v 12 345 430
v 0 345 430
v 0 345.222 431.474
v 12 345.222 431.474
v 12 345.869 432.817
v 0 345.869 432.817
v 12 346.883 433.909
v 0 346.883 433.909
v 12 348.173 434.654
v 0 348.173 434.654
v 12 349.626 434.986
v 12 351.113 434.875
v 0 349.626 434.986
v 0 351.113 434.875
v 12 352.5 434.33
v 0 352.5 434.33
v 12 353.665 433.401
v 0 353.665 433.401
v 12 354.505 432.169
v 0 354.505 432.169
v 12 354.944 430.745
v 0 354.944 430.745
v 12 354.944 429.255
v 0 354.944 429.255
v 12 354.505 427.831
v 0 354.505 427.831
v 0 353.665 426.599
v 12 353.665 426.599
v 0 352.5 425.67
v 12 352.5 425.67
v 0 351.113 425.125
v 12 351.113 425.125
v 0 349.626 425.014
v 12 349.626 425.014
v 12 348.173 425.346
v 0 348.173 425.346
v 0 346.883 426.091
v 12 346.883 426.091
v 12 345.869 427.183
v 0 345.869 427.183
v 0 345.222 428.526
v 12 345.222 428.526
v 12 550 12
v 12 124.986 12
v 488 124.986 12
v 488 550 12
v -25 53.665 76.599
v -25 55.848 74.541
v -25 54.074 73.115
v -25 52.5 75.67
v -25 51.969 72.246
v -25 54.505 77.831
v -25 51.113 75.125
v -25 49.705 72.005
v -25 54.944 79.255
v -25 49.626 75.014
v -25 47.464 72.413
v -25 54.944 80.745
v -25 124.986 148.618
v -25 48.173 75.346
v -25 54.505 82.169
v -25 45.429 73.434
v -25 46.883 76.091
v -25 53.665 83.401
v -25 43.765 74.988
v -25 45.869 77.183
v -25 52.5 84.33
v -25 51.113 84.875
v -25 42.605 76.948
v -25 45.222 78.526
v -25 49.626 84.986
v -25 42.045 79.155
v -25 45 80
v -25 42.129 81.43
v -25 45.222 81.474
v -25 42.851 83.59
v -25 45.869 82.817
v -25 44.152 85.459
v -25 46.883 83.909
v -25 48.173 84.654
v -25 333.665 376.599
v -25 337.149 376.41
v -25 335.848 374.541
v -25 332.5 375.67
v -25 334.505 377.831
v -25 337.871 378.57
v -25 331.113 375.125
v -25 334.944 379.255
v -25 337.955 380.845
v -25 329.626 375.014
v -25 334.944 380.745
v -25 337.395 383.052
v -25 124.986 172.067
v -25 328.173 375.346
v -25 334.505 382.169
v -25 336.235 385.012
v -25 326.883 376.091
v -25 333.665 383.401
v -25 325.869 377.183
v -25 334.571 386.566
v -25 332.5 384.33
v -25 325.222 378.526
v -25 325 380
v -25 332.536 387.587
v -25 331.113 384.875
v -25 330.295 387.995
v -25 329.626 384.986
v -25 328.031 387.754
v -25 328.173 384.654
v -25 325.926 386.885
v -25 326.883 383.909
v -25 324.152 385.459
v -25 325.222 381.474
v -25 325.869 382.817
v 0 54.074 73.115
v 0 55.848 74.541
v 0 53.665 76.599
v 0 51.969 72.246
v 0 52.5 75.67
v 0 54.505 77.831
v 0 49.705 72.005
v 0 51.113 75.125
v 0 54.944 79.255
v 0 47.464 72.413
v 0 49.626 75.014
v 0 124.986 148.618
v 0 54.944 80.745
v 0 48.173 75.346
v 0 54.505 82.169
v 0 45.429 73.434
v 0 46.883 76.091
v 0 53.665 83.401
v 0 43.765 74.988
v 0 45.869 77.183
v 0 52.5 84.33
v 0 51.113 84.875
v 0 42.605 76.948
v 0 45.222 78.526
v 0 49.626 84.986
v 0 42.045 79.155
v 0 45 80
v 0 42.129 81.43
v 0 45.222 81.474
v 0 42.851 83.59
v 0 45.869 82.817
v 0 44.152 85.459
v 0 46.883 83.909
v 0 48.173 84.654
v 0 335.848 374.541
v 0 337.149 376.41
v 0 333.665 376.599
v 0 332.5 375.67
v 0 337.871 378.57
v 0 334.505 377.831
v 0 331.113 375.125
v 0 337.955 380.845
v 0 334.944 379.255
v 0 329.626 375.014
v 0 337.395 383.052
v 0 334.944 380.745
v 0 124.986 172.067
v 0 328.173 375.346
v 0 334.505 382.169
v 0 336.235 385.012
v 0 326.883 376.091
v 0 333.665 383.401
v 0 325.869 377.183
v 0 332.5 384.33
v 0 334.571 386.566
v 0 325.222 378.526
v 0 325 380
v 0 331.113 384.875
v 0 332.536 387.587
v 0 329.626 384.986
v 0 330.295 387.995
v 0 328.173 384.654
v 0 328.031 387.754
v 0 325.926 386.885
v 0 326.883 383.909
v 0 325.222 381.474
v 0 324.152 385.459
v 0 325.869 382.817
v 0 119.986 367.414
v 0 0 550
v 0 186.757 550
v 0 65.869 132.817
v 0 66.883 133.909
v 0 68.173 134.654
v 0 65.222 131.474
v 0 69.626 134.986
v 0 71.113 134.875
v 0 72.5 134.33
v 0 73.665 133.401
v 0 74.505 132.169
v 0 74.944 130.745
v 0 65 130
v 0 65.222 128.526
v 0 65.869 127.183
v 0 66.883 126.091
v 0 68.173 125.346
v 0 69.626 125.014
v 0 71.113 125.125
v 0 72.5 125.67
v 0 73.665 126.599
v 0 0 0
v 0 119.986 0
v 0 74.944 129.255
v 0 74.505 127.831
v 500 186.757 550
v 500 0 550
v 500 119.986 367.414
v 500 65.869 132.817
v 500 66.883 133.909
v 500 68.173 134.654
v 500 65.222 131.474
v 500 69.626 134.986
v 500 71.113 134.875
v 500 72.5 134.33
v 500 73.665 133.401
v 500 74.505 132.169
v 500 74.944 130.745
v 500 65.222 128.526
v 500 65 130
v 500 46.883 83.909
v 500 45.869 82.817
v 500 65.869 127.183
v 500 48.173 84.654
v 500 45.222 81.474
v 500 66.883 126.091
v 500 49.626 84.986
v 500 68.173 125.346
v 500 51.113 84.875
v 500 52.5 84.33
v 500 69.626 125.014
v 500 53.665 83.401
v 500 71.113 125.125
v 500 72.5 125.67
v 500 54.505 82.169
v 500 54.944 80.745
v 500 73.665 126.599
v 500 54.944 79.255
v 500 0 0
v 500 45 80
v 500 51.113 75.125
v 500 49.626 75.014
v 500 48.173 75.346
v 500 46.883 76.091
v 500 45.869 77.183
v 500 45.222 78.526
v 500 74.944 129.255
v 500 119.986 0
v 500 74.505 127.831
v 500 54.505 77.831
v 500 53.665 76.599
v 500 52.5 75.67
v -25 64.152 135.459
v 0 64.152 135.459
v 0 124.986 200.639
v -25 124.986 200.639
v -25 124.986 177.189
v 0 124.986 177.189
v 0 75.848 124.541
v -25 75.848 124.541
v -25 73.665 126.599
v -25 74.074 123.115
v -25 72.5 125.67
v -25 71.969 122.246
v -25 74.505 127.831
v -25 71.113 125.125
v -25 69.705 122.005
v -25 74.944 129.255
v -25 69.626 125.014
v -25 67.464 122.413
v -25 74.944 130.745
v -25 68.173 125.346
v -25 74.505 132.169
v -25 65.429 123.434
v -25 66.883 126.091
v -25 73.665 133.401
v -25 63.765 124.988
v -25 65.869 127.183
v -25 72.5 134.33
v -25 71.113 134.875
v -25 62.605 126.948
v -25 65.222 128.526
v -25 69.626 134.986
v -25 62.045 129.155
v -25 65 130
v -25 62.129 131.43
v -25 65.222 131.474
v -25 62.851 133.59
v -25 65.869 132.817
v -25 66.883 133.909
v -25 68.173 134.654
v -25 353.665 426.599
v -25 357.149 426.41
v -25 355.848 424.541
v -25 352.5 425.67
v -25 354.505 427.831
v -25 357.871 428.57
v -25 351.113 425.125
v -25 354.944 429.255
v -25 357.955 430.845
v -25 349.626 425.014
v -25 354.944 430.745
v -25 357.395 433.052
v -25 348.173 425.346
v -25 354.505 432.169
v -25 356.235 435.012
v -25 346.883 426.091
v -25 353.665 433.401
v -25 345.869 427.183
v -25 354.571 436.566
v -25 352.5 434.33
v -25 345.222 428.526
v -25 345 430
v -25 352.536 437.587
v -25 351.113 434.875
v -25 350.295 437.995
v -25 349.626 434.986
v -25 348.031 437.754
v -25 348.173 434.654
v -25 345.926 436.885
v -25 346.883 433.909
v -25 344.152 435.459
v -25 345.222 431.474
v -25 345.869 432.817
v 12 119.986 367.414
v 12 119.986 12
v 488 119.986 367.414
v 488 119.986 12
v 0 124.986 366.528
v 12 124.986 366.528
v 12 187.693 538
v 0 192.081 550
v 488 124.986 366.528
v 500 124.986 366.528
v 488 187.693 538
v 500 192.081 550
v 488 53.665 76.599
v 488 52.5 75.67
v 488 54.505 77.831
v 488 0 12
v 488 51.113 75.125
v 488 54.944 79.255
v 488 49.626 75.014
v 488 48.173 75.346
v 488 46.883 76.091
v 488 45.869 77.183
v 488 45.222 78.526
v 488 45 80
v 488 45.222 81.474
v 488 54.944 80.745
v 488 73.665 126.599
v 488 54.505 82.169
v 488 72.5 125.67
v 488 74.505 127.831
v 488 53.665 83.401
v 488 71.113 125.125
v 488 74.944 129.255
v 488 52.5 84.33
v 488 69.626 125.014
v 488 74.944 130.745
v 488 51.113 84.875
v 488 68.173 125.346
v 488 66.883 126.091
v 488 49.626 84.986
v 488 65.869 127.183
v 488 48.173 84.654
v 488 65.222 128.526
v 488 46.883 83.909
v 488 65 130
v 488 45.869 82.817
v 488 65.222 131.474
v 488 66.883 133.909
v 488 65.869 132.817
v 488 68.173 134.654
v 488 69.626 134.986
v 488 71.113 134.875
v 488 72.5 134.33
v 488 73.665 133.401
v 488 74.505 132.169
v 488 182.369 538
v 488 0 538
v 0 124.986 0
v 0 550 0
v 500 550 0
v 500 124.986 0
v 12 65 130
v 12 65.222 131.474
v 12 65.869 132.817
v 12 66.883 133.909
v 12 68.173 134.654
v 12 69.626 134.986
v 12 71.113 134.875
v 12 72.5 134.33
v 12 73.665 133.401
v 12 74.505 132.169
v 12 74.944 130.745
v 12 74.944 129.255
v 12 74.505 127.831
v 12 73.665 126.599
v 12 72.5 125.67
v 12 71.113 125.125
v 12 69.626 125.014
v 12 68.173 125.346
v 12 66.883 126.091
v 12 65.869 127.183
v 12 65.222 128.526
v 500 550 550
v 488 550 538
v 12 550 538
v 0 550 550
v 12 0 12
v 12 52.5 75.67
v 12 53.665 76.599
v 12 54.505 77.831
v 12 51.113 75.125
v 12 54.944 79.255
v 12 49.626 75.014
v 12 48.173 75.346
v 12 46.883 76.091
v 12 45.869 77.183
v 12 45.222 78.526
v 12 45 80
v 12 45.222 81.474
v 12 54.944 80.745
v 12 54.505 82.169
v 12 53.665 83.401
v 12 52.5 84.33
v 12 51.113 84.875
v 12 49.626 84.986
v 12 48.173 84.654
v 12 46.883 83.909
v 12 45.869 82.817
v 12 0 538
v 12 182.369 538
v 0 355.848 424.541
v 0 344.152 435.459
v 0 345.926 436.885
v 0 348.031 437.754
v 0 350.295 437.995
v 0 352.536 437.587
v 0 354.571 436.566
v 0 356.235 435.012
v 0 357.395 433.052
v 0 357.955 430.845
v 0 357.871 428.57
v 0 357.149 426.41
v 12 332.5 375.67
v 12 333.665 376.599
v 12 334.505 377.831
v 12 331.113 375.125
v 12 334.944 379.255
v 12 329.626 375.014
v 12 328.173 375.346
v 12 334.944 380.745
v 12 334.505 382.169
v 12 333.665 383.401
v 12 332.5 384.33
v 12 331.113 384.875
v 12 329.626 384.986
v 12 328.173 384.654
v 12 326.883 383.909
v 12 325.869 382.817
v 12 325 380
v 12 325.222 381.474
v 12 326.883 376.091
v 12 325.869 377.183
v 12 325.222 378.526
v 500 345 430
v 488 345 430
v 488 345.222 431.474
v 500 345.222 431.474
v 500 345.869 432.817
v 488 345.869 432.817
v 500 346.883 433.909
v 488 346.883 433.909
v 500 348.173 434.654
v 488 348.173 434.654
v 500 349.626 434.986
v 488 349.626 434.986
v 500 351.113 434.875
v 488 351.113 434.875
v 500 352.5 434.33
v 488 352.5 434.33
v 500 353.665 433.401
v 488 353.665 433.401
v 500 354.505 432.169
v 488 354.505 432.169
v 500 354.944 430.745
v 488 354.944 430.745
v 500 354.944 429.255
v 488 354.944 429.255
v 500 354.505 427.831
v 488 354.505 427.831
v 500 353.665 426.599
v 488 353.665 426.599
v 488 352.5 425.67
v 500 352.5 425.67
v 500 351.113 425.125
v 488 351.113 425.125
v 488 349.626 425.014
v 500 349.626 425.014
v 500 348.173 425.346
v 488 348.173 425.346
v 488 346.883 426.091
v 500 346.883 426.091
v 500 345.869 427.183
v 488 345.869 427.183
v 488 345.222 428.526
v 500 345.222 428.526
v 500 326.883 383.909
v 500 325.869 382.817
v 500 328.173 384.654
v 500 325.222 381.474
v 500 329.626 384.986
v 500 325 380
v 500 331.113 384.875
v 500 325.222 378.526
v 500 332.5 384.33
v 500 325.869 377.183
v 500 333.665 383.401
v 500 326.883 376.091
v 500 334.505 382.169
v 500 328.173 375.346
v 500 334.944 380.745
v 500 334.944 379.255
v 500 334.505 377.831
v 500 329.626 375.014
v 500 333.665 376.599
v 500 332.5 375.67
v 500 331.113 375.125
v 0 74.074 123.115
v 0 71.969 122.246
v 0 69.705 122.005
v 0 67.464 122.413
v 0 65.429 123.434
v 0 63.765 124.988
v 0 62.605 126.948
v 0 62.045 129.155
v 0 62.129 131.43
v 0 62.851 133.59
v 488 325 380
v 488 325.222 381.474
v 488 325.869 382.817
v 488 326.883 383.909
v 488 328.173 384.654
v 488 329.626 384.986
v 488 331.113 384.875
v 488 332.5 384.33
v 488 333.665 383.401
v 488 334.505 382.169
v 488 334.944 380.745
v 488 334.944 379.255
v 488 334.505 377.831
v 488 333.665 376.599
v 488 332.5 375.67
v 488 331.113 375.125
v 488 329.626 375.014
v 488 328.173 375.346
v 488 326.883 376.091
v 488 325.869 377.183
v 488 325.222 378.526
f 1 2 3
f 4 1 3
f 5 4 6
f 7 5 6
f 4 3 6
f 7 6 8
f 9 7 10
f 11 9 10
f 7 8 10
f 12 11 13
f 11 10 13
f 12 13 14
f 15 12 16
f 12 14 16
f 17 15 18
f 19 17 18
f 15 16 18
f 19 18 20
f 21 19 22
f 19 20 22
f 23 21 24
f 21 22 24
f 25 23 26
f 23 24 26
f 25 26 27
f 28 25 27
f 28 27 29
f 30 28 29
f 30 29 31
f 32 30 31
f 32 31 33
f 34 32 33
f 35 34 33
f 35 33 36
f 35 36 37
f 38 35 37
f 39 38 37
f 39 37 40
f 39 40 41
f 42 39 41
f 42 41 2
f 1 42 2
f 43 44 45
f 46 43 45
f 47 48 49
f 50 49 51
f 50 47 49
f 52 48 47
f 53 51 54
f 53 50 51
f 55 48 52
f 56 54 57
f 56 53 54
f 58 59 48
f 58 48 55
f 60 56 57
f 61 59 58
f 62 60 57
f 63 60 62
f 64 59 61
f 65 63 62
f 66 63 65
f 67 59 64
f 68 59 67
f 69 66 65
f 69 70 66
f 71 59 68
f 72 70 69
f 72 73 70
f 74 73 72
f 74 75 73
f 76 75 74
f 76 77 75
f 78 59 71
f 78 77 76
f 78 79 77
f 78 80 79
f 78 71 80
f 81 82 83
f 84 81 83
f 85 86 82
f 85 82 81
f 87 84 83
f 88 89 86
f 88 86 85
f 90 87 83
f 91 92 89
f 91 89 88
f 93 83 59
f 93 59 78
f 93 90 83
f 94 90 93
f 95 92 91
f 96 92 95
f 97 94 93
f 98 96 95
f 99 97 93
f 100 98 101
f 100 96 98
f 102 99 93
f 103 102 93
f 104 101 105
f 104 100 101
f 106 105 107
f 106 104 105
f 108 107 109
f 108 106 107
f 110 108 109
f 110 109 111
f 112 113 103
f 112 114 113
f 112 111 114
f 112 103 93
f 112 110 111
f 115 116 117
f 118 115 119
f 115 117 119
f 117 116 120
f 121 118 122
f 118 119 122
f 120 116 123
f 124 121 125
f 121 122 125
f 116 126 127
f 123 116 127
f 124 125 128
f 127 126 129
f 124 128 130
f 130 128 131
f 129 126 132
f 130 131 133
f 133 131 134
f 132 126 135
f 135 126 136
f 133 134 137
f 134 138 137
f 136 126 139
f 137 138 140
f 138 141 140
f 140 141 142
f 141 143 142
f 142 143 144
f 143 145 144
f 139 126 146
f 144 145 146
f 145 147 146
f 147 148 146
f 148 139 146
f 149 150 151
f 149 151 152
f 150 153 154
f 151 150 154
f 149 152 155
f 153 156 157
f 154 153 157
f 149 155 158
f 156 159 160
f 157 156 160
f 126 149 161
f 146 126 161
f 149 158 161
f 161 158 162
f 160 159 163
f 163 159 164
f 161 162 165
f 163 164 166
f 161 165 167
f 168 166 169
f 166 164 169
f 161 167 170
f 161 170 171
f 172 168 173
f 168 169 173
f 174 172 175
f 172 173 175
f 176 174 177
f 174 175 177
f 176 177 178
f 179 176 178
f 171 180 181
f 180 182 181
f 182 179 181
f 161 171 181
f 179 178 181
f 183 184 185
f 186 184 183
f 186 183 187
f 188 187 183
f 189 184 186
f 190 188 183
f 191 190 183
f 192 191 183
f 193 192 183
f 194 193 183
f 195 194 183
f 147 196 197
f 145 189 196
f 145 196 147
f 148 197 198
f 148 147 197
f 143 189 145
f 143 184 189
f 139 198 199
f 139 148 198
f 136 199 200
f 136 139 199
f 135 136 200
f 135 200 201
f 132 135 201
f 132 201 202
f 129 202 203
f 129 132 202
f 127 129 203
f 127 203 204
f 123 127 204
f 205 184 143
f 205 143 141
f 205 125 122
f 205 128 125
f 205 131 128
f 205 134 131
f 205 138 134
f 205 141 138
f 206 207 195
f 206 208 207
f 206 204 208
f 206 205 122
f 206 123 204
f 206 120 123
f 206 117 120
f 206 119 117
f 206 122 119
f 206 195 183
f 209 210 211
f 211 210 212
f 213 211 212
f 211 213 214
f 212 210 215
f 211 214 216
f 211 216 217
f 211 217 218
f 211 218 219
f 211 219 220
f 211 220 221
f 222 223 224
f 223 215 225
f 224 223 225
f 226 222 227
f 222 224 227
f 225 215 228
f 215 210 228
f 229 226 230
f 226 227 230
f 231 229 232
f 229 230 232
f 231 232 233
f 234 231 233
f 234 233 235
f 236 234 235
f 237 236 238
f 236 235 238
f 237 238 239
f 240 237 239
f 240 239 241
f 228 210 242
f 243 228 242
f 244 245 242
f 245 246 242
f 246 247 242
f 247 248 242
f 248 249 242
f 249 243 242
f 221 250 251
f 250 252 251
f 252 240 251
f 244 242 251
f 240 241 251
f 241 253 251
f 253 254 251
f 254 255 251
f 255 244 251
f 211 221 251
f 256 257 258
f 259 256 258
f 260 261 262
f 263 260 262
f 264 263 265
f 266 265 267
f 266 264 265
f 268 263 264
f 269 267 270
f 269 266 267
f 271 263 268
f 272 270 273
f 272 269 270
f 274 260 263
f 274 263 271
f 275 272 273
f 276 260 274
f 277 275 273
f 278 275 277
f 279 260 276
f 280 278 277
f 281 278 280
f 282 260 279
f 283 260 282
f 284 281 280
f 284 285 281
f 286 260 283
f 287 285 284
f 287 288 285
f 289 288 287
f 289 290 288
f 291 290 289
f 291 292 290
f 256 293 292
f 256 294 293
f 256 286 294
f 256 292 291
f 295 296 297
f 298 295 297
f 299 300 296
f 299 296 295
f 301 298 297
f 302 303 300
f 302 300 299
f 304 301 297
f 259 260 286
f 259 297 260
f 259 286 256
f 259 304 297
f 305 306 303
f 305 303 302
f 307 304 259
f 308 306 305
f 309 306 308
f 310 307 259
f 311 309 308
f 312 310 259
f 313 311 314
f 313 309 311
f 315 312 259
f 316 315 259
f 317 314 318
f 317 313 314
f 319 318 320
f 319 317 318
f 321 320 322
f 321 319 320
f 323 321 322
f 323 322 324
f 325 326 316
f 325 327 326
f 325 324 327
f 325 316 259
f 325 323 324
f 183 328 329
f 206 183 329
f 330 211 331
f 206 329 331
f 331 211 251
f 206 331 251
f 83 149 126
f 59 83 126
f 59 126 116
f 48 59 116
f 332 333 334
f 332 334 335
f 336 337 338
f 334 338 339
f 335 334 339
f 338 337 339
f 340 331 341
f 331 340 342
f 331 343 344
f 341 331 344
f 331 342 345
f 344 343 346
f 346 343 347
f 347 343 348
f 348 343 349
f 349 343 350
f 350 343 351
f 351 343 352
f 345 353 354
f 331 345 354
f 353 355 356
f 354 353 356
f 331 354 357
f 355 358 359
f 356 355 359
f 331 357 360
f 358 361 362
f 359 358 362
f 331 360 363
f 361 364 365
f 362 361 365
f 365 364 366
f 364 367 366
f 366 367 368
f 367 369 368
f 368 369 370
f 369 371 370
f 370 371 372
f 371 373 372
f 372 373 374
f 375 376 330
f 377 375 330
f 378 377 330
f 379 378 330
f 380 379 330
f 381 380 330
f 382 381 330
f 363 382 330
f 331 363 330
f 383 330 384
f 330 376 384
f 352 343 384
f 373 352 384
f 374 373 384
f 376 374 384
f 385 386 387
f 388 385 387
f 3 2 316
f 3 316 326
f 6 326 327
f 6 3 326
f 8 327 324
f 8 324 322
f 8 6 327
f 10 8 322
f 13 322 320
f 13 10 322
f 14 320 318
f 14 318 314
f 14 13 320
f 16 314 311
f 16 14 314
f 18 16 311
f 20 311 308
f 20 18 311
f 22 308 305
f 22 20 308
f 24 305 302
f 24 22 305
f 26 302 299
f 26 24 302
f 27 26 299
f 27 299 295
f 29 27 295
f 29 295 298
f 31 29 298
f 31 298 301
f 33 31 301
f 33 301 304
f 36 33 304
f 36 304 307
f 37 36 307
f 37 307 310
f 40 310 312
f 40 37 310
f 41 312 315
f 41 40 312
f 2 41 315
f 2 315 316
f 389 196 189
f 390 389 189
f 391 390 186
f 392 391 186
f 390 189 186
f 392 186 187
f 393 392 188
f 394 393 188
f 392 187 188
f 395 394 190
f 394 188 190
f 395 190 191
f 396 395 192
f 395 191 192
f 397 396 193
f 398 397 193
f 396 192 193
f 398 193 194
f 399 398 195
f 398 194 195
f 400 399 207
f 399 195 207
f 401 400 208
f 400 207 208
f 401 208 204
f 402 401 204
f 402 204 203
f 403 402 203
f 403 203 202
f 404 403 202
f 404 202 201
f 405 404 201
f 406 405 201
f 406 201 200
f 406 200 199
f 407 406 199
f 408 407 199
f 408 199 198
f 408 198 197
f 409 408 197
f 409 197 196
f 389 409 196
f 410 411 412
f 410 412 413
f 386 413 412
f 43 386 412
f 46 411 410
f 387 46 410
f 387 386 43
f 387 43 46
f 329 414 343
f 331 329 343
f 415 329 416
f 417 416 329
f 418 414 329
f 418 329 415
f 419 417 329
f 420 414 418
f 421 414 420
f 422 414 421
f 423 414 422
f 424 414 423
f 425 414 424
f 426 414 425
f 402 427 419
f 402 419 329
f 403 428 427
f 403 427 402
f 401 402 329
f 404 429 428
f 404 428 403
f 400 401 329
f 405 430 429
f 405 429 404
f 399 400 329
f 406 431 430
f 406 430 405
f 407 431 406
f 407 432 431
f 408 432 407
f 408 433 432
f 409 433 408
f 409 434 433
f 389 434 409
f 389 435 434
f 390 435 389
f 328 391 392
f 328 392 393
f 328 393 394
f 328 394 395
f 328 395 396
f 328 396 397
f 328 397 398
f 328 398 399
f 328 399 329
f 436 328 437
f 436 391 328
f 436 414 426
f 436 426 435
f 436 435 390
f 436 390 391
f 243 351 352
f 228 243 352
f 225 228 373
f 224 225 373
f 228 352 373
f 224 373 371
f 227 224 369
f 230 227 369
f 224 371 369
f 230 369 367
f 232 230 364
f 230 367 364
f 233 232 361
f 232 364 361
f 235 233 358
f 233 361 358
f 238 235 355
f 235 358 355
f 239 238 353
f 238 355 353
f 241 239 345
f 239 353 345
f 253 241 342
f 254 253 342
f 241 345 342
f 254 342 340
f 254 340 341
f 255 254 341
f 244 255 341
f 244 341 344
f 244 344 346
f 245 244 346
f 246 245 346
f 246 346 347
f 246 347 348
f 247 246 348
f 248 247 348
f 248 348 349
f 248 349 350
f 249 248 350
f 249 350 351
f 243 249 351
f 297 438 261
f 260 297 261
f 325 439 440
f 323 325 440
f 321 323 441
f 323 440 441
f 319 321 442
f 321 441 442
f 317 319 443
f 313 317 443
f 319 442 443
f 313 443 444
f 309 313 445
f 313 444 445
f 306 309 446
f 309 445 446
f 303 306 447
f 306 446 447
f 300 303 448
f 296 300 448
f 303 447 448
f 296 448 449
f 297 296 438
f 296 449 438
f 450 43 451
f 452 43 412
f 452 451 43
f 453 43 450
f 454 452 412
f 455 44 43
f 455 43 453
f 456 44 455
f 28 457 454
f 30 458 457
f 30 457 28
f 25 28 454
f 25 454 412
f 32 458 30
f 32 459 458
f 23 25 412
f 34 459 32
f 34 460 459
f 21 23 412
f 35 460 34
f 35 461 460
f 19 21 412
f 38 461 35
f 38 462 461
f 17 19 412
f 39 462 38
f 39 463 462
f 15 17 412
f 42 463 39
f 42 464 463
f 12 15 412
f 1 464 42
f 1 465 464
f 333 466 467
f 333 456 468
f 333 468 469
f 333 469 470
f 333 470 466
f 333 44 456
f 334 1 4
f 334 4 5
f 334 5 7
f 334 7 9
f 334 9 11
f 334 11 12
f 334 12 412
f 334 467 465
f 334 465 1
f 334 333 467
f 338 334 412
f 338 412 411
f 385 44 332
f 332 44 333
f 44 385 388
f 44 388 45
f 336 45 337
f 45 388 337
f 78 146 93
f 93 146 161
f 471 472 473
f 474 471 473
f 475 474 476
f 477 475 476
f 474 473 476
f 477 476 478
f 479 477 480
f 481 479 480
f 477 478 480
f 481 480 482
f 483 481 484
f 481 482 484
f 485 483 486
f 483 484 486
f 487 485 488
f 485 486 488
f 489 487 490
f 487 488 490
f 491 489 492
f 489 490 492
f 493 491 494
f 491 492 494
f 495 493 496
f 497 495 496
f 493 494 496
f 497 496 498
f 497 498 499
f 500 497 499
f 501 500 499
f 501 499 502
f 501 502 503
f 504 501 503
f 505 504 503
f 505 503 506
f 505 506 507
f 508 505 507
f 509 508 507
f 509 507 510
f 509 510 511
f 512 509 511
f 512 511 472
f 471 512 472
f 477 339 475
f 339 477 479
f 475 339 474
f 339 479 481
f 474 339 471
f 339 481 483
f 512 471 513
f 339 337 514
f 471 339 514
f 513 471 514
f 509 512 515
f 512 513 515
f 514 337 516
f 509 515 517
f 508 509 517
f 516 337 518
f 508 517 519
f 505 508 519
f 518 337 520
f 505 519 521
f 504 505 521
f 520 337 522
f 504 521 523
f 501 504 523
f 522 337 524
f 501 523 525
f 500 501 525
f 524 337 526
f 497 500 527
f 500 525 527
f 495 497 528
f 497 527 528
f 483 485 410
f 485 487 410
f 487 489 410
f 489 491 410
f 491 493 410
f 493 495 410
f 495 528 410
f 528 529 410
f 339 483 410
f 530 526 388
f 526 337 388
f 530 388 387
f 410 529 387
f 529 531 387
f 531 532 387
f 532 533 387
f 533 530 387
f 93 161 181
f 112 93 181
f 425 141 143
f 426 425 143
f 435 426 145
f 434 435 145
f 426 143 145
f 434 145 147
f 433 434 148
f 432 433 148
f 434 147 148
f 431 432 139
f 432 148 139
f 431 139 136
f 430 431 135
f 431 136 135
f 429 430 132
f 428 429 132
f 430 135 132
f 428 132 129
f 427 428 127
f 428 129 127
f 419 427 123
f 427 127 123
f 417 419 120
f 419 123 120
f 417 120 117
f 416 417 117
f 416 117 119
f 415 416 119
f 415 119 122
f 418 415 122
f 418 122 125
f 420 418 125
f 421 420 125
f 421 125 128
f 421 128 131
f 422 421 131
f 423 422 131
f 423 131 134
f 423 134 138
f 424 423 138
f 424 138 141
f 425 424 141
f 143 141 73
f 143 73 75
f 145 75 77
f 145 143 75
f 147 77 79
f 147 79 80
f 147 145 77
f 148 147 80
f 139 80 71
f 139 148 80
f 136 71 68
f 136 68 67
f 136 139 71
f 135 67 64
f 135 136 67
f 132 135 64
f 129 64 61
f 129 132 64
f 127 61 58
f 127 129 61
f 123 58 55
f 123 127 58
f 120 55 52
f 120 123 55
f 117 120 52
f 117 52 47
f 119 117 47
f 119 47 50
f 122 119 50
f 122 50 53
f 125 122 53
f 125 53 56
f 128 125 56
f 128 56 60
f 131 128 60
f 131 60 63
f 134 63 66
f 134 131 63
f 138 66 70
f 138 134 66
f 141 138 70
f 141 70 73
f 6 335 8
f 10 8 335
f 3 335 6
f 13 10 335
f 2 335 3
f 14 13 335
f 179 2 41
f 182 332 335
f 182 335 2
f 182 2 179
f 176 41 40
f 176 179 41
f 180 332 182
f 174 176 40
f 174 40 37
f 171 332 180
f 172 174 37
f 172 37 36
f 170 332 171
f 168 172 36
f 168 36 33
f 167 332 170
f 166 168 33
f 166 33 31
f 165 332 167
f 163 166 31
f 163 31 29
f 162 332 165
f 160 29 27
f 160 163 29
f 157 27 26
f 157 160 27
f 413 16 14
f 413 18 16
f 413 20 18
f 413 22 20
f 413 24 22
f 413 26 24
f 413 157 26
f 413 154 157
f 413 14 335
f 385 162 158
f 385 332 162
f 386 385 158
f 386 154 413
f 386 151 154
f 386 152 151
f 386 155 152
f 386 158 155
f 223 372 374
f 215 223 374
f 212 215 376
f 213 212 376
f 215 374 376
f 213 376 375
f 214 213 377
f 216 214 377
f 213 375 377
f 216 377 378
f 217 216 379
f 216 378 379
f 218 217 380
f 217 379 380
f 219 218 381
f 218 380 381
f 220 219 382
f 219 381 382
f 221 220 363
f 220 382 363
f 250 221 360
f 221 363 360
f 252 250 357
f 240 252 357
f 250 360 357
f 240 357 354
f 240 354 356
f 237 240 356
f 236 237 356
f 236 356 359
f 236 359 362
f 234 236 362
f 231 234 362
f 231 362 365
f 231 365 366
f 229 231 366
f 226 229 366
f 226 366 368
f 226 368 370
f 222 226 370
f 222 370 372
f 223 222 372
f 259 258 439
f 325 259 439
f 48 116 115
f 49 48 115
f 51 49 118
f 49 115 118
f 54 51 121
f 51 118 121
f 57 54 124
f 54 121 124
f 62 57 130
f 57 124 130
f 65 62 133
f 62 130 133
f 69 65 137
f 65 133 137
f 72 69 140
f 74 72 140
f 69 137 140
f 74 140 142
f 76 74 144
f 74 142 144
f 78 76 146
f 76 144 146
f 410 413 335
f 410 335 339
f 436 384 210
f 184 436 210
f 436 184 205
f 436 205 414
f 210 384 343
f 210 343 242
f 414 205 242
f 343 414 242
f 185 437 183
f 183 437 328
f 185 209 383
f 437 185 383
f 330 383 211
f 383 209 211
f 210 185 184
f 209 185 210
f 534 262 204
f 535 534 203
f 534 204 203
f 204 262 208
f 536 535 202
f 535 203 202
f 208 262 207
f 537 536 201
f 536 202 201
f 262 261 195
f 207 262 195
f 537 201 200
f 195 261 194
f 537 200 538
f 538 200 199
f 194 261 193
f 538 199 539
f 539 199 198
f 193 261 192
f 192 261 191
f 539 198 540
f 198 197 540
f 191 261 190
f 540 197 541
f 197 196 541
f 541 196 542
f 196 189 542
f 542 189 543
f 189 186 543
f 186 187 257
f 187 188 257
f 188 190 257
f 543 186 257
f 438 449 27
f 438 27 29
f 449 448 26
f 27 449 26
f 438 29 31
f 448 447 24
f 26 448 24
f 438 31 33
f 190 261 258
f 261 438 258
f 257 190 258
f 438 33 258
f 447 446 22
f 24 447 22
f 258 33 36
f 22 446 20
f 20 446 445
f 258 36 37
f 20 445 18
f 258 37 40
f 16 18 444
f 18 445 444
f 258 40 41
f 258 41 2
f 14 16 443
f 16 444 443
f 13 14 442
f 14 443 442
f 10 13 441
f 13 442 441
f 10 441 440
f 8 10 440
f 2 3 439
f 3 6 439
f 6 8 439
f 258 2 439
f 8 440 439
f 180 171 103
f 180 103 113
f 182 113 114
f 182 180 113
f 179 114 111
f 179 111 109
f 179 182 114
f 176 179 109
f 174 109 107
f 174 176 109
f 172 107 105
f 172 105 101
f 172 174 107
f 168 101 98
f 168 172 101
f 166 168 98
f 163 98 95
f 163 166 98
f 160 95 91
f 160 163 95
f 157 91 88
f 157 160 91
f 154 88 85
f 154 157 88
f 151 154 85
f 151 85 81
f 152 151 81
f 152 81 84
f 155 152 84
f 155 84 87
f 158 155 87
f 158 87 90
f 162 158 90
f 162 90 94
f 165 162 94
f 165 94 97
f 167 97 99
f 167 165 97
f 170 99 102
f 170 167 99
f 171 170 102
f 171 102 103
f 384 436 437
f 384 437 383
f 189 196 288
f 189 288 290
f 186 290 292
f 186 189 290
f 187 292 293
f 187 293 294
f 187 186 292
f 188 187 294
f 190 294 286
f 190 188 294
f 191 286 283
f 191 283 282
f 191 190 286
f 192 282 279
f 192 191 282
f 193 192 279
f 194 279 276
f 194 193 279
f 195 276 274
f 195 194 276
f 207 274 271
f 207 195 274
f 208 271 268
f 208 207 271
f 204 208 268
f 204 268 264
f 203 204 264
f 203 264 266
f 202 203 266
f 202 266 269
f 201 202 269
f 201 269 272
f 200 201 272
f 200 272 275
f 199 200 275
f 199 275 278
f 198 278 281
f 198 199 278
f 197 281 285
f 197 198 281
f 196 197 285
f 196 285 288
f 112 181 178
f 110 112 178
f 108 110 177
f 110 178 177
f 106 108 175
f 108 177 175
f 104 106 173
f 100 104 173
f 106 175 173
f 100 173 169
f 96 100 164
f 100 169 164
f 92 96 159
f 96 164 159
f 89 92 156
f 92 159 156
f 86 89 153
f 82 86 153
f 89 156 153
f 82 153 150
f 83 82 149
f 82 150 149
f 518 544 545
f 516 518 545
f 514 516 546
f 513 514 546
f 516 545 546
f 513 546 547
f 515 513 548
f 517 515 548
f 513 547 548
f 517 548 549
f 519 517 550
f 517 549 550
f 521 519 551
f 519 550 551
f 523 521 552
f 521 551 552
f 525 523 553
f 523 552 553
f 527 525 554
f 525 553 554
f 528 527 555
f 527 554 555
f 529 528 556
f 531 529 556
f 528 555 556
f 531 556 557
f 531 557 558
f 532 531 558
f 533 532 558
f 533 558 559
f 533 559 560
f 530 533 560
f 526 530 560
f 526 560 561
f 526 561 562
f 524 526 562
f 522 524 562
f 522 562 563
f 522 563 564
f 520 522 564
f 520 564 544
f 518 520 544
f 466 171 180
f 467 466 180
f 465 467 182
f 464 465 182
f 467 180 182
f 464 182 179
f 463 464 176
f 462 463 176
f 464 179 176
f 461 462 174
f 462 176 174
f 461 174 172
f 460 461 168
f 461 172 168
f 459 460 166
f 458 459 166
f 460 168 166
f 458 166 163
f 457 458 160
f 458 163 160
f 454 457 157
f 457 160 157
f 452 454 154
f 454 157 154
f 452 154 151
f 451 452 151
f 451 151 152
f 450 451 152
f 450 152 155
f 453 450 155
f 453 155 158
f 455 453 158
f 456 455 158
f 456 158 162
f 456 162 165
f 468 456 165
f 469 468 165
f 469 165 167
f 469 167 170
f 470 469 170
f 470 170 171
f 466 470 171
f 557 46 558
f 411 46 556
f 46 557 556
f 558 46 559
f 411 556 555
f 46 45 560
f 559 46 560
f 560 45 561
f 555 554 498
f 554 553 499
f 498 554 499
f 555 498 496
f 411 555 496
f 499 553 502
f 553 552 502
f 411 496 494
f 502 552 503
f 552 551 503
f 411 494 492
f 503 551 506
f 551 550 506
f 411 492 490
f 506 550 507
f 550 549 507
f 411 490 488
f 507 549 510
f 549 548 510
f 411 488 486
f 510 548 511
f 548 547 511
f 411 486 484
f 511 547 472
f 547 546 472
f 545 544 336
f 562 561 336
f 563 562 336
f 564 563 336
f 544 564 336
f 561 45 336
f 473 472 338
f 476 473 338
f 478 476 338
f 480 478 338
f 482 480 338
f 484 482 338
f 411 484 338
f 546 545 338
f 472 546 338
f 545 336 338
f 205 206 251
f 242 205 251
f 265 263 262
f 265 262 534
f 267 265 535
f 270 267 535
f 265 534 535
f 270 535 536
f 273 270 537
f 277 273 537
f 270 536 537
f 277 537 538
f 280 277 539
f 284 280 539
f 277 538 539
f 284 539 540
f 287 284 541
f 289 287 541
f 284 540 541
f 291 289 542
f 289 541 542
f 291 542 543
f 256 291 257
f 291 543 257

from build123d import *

# Parameters (mm, degrees)
F0_W     = 500
F0_H     = 550
F1_DEPTH = 550
F3_DEPTH = 588
F4_W     = 476
F4_H     = 526
F5_DEPTH = 550.001
F6_R     = 5
F7_DEPTH = 25
F8_DEPTH = 1105


with BuildPart() as f1:
    # F0 (on Top) → F1 (new body)
    with BuildSketch(Plane.XY):
        with Locations((250, 275)):
            Rectangle(F0_W, F0_H)
    extrude(amount=F1_DEPTH)

    # F2 (on face) → F3 (cut)
    with BuildSketch(Plane.YZ.offset(500)):
        Polygon((119.9864, 367.413739), (119.9864, 0), (124.9864, 0), (124.9864, 366.52818), (192.081049, 550), (186.757205, 550), align=None)
    extrude(amount=-F3_DEPTH, mode=Mode.SUBTRACT)

    # F4 (on face) → F5 (cut, through all)
    with BuildSketch(Plane.XZ):
        with Locations((250, 275)):
            Rectangle(F4_W, F4_H)
    extrude(amount=-F5_DEPTH, mode=Mode.SUBTRACT)

    # F6 (on face) → F8 (cut)
    with BuildSketch(Plane(origin=(0, 0, 0), x_dir=(0, -1, 0), z_dir=(-1, 0, 0))):
        with Locations((-350, 430)):
            Circle(F6_R)
        with Locations((-330, 380)):
            Circle(F6_R)
        with Locations((-70, 130)):
            Circle(F6_R)
        with Locations((-50, 80)):
            Circle(F6_R)
    extrude(amount=-F8_DEPTH, mode=Mode.SUBTRACT)


with BuildPart() as f7:
    # F6 (on face) → F7 (new body)
    with BuildSketch(Plane(origin=(0, 0, 0), x_dir=(0, -1, 0), z_dir=(-1, 0, 0))):
        with BuildLine():
            Line((-64.151558, 135.458546), (-124.9864, 200.638734))
            Line((-124.9864, 200.638734), (-124.9864, 177.189266))
            Line((-124.9864, 177.189266), (-75.848442, 124.541454))
            ThreePointArc((-75.848442, 124.541454), (-64.541454, 124.151558), (-64.151558, 135.458546))
        make_face()
        with Locations((-70, 130)):
            Circle(F6_R, mode=Mode.SUBTRACT)
        with BuildLine():
            Line((-124.9864, 172.067305), (-124.9864, 148.617837))
            Line((-124.9864, 148.617837), (-55.848442, 74.541454))
            ThreePointArc((-55.848442, 74.541454), (-44.541454, 74.151558), (-44.151558, 85.458546))
            Line((-44.151558, 85.458546), (-124.9864, 172.067305))
        make_face()
        with Locations((-50, 80)):
            Circle(F6_R, mode=Mode.SUBTRACT)
        with BuildLine():
            Line((-335.848442, 374.541454), (-124.9864, 148.617837))
            Line((-124.9864, 148.617837), (-124.9864, 172.067305))
            Line((-124.9864, 172.067305), (-324.151558, 385.458546))
            ThreePointArc((-324.151558, 385.458546), (-335.458546, 385.848442), (-335.848442, 374.541454))
        make_face()
        with Locations((-330, 380)):
            Circle(F6_R, mode=Mode.SUBTRACT)
        with BuildLine():
            Line((-124.9864, 177.189266), (-124.9864, 200.638734))
            Line((-124.9864, 200.638734), (-344.151558, 435.458546))
            ThreePointArc((-344.151558, 435.458546), (-355.458546, 435.848442), (-355.848442, 424.541454))
            Line((-355.848442, 424.541454), (-124.9864, 177.189266))
        make_face()
        with Locations((-350, 430)):
            Circle(F6_R, mode=Mode.SUBTRACT)
    extrude(amount=F7_DEPTH)


solid = Compound([f1.part, f7.part])
